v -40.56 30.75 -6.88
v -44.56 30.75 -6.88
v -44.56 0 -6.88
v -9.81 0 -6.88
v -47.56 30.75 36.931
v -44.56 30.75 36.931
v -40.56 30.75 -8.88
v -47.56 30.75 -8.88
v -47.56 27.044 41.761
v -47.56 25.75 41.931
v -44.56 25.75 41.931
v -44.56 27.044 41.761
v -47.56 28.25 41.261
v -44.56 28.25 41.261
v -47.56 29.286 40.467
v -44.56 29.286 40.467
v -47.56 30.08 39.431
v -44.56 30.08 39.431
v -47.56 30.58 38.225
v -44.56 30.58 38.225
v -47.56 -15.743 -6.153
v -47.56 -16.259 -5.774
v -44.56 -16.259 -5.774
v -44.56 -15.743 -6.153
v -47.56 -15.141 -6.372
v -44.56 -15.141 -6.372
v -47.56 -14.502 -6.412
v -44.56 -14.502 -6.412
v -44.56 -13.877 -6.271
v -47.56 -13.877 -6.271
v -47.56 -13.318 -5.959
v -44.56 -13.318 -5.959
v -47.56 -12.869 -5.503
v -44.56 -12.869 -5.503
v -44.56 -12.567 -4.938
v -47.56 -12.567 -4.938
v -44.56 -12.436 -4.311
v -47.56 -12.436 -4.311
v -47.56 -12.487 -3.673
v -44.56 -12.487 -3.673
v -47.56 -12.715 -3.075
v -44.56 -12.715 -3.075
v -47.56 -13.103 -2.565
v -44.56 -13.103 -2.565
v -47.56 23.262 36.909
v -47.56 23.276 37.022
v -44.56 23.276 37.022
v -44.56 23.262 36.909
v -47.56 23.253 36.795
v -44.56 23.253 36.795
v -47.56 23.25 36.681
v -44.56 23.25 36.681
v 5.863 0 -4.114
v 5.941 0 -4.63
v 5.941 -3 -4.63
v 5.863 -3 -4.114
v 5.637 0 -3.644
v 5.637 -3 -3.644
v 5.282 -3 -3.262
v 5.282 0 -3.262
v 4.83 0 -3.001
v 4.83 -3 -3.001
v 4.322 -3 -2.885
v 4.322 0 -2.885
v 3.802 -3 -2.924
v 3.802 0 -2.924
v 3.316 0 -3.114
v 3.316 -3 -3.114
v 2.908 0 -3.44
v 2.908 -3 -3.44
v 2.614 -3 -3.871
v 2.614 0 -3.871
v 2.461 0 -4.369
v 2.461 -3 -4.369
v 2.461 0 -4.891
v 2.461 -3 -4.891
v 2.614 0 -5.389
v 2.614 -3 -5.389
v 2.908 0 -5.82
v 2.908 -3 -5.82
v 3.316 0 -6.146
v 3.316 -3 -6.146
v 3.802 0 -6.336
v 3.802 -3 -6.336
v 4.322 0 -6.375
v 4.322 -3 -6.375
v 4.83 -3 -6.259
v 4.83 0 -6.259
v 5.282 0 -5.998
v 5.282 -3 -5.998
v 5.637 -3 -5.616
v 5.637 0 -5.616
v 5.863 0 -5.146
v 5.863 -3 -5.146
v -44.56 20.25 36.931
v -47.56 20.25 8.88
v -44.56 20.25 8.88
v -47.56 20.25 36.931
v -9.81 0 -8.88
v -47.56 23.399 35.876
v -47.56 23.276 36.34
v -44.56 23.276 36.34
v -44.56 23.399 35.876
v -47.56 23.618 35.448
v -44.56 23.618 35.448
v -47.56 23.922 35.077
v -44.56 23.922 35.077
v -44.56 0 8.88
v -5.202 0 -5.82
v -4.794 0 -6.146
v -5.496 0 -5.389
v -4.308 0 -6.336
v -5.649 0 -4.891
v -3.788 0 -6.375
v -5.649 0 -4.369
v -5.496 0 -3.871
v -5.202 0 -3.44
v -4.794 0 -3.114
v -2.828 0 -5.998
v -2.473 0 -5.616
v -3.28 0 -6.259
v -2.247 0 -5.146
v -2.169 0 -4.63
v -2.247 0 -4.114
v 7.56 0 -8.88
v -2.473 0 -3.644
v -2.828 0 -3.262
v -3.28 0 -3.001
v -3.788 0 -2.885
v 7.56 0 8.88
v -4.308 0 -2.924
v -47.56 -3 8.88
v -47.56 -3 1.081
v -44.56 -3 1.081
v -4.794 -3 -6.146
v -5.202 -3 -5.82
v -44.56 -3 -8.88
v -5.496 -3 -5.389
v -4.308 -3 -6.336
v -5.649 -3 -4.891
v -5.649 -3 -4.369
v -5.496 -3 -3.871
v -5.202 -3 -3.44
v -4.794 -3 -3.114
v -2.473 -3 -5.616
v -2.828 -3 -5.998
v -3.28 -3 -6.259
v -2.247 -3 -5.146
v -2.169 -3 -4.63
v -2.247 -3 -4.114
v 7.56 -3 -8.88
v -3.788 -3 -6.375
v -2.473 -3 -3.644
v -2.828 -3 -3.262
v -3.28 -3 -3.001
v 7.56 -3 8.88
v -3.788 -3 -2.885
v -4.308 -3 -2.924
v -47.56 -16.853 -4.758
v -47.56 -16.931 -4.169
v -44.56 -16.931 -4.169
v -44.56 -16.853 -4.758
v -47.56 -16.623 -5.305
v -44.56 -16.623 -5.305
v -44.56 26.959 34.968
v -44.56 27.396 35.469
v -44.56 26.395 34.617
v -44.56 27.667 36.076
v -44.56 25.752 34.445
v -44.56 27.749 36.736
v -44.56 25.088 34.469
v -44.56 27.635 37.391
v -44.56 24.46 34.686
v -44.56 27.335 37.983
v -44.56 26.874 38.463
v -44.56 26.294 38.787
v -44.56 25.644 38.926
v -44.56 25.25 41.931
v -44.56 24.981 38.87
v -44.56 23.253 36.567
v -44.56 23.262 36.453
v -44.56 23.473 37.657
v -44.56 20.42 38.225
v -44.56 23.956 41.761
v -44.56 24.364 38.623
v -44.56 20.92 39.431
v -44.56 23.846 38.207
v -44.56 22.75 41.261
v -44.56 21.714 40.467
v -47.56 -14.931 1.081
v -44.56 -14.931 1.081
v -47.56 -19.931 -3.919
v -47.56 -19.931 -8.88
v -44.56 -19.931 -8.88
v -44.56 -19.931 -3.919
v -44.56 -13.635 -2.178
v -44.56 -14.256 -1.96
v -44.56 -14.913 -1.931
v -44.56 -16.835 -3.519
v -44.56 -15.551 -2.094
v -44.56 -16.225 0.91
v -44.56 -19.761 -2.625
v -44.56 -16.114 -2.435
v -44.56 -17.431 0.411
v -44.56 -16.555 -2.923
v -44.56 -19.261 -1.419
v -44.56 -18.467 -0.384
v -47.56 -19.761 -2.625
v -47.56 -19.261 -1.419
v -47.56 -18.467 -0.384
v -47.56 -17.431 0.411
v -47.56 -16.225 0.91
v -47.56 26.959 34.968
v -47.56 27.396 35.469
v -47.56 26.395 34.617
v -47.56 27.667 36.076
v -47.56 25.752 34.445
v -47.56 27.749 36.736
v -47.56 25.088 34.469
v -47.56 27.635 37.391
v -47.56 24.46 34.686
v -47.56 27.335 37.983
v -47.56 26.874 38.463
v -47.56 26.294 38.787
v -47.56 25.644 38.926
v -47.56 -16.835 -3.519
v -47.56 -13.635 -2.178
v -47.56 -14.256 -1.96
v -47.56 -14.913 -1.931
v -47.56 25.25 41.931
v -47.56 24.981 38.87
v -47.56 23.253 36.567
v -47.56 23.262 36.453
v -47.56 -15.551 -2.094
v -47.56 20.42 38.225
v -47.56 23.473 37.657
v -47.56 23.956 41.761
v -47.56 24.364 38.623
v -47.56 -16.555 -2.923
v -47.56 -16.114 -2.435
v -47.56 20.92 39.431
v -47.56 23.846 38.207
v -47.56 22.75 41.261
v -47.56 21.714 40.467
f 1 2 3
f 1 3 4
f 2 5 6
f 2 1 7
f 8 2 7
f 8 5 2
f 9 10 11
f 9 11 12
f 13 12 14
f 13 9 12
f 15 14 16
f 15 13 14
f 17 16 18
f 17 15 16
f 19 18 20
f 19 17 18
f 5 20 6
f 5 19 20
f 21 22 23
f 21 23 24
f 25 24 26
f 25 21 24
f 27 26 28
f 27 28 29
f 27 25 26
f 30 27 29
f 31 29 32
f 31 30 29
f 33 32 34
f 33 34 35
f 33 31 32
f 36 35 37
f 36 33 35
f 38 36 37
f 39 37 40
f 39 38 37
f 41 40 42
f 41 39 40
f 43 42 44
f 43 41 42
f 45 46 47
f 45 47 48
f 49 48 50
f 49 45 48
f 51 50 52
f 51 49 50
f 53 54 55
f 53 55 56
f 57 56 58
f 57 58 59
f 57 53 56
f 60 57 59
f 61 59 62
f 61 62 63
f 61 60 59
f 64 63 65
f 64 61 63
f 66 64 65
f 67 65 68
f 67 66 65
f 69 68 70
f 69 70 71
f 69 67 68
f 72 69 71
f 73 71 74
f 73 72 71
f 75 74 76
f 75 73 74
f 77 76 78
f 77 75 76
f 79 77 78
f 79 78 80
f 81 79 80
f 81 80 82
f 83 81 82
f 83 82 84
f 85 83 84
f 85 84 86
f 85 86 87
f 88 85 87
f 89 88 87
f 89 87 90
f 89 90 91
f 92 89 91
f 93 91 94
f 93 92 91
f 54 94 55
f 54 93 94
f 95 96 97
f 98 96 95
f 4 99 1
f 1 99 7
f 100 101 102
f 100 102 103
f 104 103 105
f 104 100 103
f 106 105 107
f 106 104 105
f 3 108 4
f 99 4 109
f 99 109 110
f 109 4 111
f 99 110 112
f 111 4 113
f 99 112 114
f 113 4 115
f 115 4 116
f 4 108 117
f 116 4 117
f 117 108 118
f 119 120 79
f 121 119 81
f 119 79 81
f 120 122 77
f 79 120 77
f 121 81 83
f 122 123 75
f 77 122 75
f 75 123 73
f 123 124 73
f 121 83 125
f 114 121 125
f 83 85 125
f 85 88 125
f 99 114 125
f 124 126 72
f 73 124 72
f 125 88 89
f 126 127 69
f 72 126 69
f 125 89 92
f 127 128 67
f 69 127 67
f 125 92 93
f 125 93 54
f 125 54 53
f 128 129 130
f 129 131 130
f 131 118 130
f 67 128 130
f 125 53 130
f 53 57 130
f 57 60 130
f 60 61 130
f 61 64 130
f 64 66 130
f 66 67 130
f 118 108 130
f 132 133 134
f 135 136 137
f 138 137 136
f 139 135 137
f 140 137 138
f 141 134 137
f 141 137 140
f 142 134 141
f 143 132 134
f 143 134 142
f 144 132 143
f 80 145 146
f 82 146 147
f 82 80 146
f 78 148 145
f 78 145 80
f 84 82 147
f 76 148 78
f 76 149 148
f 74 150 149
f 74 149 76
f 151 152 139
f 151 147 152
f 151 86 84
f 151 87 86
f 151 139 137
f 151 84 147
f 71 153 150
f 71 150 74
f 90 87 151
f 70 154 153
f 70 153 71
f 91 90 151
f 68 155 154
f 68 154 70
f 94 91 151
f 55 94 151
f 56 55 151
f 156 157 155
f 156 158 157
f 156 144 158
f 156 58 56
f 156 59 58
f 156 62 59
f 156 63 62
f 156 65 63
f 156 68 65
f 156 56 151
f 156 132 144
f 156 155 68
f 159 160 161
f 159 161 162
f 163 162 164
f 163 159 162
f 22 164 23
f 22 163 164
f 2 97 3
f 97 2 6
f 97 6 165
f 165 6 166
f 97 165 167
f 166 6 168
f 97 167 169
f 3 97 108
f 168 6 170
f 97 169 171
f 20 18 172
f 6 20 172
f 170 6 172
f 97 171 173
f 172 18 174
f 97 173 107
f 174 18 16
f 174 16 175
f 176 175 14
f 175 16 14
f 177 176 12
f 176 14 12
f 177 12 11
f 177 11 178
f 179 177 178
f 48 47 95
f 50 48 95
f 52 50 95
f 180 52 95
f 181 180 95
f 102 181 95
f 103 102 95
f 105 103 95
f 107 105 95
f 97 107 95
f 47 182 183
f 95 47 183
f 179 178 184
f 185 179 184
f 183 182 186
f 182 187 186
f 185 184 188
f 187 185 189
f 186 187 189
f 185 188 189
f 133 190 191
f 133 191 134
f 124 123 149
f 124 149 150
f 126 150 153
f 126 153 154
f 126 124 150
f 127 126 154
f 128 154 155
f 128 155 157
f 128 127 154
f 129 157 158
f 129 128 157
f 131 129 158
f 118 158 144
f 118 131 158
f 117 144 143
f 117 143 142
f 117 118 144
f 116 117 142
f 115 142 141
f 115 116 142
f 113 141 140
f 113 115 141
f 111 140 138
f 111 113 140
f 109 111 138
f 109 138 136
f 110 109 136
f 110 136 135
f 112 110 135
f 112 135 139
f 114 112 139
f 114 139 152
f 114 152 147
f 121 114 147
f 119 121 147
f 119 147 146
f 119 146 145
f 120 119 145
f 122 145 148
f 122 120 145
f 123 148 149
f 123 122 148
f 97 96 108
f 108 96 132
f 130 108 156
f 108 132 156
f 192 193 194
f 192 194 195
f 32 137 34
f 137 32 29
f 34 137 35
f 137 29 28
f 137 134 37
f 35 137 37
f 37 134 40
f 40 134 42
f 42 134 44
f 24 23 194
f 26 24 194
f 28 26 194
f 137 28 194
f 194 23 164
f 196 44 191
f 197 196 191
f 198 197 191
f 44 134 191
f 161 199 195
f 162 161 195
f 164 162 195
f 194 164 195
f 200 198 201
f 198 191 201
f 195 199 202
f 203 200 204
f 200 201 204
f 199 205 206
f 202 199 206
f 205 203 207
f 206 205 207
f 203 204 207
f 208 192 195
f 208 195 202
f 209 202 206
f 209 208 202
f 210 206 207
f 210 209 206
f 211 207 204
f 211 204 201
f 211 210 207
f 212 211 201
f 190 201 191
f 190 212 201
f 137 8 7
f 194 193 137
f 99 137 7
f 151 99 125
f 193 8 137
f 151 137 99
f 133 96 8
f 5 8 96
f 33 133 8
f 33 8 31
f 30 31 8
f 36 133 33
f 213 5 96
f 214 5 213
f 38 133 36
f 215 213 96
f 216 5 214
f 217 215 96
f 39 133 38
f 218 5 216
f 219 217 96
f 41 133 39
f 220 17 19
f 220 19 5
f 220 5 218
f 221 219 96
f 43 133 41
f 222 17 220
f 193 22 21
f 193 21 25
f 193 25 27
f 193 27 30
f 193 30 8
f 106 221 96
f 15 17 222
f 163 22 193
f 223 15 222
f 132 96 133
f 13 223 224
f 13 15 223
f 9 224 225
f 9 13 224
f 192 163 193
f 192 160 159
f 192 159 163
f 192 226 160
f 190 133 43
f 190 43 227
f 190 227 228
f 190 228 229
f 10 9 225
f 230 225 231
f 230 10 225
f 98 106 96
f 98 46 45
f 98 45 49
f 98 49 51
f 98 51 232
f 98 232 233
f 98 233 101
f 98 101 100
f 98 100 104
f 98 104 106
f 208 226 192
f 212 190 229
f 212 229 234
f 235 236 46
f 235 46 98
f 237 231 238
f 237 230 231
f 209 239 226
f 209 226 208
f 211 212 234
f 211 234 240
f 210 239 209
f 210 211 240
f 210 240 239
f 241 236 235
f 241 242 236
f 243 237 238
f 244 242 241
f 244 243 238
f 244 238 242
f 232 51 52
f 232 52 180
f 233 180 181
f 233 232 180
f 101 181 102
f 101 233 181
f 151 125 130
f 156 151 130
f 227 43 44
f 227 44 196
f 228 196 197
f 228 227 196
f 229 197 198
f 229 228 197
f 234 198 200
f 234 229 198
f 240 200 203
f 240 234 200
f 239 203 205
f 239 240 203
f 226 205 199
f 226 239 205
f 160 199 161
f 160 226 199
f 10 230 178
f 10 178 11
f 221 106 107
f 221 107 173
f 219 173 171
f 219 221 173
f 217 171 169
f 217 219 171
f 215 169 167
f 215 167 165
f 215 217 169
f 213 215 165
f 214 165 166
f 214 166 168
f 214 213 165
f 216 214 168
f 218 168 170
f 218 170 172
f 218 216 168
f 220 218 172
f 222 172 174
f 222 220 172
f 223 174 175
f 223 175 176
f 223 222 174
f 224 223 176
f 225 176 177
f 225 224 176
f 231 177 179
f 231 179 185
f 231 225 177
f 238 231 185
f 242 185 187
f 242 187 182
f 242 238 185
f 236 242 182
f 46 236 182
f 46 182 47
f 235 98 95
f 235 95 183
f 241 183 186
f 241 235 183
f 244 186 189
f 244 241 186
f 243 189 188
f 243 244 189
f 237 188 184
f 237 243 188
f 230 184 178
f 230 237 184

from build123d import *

# Parameters (mm, degrees)
F0_W        = 15.12
F0_H        = 17.76
F0_R        = 1.75
F0_W_2      = 3
F0_H_2      = 15.76
F0_W_3      = 35
F0_H_3      = 2
F1_DEPTH    = 3
F2_DEPTH    = 30.75
F4_DEPTH    = 3
F5_T4_DEPTH = 161.4443452539


# Not quite as in the source:
# - a fillet or chamfer that OpenCascade refuses, or shapes differently, is made with other operations: its cross-section is extruded or revolved along the edge and cut away or added


with BuildPart() as f1:
    # F0 (on Front) → F1 (new body)
    with BuildSketch(Plane.XZ):
        Rectangle(F0_W, F0_H)
        with Locations((-3.9189920692, -4.63)):
            Circle(F0_R, mode=Mode.SUBTRACT)
        with Locations((4.1910079308, -4.63)):
            Circle(F0_R, mode=Mode.SUBTRACT)
        Polygon((-7.56, -8.88), (-7.56, 8.88), (-44.56, 8.88), (-44.56, -6.88), (-9.56, -6.88), (-9.56, -8.88), align=None)
        with Locations((-46.06, 1)):
            Rectangle(F0_W_2, F0_H_2)
        with Locations((-27.06, -7.88)):
            Rectangle(F0_W_3, F0_H_3)
        with Locations((-46.06, -7.88)):
            Rectangle(F0_W_2, F0_H_3)
    extrude(amount=F1_DEPTH)

    # F0 (on Front) → F2 (join)
    with BuildSketch(Plane.XZ):
        with Locations((-46.06, 1)):
            Rectangle(F0_W_2, F0_H_2)
        with Locations((-46.06, -7.88)):
            Rectangle(F0_W_2, F0_H_3)
        with Locations((-27.06, -7.88)):
            Rectangle(F0_W_3, F0_H_3)
    extrude(amount=-F2_DEPTH)

    # F3 (on face) → F4 (join)
    with BuildSketch(Plane(origin=(-47.56, 0, 0), x_dir=(0, -1, 0), z_dir=(-1, 0, 0))):
        with BuildLine():
            Line((-30.75, 36.9310820997), (-30.75, 34.42))
            Line((-30.75, 34.42), (-23.2759684913, 34.42))
            Line((-23.2759684913, 34.42), (-20.25, 34.42))
            Line((-20.25, 34.42), (-20.25, 36.9310820997))
            ThreePointArc((-20.25, 36.9310820997), (-21.7144660941, 40.4666160056), (-25.25, 41.9310820997))
            Line((-25.25, 41.9310820997), (-25.75, 41.9310820997))
            ThreePointArc((-25.75, 41.9310820997), (-29.2855339059, 40.4666160056), (-30.75, 36.9310820997))
        make_face()
        with BuildLine():
            Line((-23.2759684913, 36.3402245806), (-23.2759684913, 34.42))
            Line((-23.2759684913, 34.42), (-23.922206416, 35.0770037331))
            ThreePointArc((-23.922206416, 35.0770037331), (-27.6352195224, 37.3905449889), (-23.2759684913, 37.0219396188))
            ThreePointArc((-23.2759684913, 37.0219396188), (-23.2565015161, 36.852004751), (-23.25, 36.6810820997))
            ThreePointArc((-23.25, 36.6810820997), (-23.2565015161, 36.5101594484), (-23.2759684913, 36.3402245806))
        make_face(mode=Mode.SUBTRACT)
        Polygon((-30.75, 34.42), (-30.75, 8.88), (-20.25, 8.88), (-20.25, 31.3436212872), (-23.2759684913, 34.42), align=None)
        Polygon((-23.2759684913, 34.42), (-20.25, 31.3436212872), (-20.25, 34.42), align=None)
        with BuildLine():
            Line((3, 1.0805530297), (3, -8.88))
            Line((3, -8.88), (19.3145081394, -8.88))
            Line((19.3145081394, -8.88), (16.2589368567, -5.7735253369))
            ThreePointArc((16.2589368567, -5.7735253369), (13.0770649061, -5.7472405543), (13.1033496887, -2.5653686037))
            Line((13.1033496887, -2.5653686037), (9.517170933, 1.0805530297))
            Line((9.517170933, 1.0805530297), (3, 1.0805530297))
        make_face()
        with BuildLine():
            Line((16.2589368567, -5.7735253369), (19.3145081394, -8.88))
            Line((19.3145081394, -8.88), (19.9311432727, -8.88))
            Line((19.9311432727, -8.88), (19.9311432727, -3.9194469703))
            ThreePointArc((19.9311432727, -3.9194469703), (18.4666771787, -0.3839130644), (14.9311432727, 1.0805530297))
            Line((14.9311432727, 1.0805530297), (9.517170933, 1.0805530297))
            Line((9.517170933, 1.0805530297), (13.1033496887, -2.5653686037))
            ThreePointArc((13.1033496887, -2.5653686037), (15.5507594053, -2.0942920889), (16.9311432727, -4.1694469703))
            ThreePointArc((16.9311432727, -4.1694469703), (16.7562981542, -5.0390631029), (16.2589368567, -5.7735253369))
        make_face()
        with BuildLine():
            Line((-23.922206416, 35.0770037331), (-23.2759684913, 34.42))
            Line((-23.2759684913, 34.42), (-23.2759684913, 36.3402245806))
            ThreePointArc((-23.2759684913, 36.3402245806), (-23.4969023398, 35.6563383445), (-23.922206416, 35.0770037331))
        make_face()
    extrude(amount=-F4_DEPTH)

    # F5: chamfer of 31 on 1 edges, made by hand


with BuildPart() as f5_tool2:
    # F5_s3 → F5_t4 (new body)
    with BuildSketch(Plane.XY.offset(-88.6021726269)):
        Polygon((-9.56, -0.25), (-40.56, 30.75), (-9.56, 30.75), align=None)
    extrude(amount=F5_T4_DEPTH)

    split(bisect_by=Plane.XZ, keep=Keep.BOTTOM)


with BuildPart() as f1_1:
    add(f1.part)

    # F5_t1: cut F5_tool2
    add(f5_tool2.part, mode=Mode.SUBTRACT)


solid = f1_1.part
